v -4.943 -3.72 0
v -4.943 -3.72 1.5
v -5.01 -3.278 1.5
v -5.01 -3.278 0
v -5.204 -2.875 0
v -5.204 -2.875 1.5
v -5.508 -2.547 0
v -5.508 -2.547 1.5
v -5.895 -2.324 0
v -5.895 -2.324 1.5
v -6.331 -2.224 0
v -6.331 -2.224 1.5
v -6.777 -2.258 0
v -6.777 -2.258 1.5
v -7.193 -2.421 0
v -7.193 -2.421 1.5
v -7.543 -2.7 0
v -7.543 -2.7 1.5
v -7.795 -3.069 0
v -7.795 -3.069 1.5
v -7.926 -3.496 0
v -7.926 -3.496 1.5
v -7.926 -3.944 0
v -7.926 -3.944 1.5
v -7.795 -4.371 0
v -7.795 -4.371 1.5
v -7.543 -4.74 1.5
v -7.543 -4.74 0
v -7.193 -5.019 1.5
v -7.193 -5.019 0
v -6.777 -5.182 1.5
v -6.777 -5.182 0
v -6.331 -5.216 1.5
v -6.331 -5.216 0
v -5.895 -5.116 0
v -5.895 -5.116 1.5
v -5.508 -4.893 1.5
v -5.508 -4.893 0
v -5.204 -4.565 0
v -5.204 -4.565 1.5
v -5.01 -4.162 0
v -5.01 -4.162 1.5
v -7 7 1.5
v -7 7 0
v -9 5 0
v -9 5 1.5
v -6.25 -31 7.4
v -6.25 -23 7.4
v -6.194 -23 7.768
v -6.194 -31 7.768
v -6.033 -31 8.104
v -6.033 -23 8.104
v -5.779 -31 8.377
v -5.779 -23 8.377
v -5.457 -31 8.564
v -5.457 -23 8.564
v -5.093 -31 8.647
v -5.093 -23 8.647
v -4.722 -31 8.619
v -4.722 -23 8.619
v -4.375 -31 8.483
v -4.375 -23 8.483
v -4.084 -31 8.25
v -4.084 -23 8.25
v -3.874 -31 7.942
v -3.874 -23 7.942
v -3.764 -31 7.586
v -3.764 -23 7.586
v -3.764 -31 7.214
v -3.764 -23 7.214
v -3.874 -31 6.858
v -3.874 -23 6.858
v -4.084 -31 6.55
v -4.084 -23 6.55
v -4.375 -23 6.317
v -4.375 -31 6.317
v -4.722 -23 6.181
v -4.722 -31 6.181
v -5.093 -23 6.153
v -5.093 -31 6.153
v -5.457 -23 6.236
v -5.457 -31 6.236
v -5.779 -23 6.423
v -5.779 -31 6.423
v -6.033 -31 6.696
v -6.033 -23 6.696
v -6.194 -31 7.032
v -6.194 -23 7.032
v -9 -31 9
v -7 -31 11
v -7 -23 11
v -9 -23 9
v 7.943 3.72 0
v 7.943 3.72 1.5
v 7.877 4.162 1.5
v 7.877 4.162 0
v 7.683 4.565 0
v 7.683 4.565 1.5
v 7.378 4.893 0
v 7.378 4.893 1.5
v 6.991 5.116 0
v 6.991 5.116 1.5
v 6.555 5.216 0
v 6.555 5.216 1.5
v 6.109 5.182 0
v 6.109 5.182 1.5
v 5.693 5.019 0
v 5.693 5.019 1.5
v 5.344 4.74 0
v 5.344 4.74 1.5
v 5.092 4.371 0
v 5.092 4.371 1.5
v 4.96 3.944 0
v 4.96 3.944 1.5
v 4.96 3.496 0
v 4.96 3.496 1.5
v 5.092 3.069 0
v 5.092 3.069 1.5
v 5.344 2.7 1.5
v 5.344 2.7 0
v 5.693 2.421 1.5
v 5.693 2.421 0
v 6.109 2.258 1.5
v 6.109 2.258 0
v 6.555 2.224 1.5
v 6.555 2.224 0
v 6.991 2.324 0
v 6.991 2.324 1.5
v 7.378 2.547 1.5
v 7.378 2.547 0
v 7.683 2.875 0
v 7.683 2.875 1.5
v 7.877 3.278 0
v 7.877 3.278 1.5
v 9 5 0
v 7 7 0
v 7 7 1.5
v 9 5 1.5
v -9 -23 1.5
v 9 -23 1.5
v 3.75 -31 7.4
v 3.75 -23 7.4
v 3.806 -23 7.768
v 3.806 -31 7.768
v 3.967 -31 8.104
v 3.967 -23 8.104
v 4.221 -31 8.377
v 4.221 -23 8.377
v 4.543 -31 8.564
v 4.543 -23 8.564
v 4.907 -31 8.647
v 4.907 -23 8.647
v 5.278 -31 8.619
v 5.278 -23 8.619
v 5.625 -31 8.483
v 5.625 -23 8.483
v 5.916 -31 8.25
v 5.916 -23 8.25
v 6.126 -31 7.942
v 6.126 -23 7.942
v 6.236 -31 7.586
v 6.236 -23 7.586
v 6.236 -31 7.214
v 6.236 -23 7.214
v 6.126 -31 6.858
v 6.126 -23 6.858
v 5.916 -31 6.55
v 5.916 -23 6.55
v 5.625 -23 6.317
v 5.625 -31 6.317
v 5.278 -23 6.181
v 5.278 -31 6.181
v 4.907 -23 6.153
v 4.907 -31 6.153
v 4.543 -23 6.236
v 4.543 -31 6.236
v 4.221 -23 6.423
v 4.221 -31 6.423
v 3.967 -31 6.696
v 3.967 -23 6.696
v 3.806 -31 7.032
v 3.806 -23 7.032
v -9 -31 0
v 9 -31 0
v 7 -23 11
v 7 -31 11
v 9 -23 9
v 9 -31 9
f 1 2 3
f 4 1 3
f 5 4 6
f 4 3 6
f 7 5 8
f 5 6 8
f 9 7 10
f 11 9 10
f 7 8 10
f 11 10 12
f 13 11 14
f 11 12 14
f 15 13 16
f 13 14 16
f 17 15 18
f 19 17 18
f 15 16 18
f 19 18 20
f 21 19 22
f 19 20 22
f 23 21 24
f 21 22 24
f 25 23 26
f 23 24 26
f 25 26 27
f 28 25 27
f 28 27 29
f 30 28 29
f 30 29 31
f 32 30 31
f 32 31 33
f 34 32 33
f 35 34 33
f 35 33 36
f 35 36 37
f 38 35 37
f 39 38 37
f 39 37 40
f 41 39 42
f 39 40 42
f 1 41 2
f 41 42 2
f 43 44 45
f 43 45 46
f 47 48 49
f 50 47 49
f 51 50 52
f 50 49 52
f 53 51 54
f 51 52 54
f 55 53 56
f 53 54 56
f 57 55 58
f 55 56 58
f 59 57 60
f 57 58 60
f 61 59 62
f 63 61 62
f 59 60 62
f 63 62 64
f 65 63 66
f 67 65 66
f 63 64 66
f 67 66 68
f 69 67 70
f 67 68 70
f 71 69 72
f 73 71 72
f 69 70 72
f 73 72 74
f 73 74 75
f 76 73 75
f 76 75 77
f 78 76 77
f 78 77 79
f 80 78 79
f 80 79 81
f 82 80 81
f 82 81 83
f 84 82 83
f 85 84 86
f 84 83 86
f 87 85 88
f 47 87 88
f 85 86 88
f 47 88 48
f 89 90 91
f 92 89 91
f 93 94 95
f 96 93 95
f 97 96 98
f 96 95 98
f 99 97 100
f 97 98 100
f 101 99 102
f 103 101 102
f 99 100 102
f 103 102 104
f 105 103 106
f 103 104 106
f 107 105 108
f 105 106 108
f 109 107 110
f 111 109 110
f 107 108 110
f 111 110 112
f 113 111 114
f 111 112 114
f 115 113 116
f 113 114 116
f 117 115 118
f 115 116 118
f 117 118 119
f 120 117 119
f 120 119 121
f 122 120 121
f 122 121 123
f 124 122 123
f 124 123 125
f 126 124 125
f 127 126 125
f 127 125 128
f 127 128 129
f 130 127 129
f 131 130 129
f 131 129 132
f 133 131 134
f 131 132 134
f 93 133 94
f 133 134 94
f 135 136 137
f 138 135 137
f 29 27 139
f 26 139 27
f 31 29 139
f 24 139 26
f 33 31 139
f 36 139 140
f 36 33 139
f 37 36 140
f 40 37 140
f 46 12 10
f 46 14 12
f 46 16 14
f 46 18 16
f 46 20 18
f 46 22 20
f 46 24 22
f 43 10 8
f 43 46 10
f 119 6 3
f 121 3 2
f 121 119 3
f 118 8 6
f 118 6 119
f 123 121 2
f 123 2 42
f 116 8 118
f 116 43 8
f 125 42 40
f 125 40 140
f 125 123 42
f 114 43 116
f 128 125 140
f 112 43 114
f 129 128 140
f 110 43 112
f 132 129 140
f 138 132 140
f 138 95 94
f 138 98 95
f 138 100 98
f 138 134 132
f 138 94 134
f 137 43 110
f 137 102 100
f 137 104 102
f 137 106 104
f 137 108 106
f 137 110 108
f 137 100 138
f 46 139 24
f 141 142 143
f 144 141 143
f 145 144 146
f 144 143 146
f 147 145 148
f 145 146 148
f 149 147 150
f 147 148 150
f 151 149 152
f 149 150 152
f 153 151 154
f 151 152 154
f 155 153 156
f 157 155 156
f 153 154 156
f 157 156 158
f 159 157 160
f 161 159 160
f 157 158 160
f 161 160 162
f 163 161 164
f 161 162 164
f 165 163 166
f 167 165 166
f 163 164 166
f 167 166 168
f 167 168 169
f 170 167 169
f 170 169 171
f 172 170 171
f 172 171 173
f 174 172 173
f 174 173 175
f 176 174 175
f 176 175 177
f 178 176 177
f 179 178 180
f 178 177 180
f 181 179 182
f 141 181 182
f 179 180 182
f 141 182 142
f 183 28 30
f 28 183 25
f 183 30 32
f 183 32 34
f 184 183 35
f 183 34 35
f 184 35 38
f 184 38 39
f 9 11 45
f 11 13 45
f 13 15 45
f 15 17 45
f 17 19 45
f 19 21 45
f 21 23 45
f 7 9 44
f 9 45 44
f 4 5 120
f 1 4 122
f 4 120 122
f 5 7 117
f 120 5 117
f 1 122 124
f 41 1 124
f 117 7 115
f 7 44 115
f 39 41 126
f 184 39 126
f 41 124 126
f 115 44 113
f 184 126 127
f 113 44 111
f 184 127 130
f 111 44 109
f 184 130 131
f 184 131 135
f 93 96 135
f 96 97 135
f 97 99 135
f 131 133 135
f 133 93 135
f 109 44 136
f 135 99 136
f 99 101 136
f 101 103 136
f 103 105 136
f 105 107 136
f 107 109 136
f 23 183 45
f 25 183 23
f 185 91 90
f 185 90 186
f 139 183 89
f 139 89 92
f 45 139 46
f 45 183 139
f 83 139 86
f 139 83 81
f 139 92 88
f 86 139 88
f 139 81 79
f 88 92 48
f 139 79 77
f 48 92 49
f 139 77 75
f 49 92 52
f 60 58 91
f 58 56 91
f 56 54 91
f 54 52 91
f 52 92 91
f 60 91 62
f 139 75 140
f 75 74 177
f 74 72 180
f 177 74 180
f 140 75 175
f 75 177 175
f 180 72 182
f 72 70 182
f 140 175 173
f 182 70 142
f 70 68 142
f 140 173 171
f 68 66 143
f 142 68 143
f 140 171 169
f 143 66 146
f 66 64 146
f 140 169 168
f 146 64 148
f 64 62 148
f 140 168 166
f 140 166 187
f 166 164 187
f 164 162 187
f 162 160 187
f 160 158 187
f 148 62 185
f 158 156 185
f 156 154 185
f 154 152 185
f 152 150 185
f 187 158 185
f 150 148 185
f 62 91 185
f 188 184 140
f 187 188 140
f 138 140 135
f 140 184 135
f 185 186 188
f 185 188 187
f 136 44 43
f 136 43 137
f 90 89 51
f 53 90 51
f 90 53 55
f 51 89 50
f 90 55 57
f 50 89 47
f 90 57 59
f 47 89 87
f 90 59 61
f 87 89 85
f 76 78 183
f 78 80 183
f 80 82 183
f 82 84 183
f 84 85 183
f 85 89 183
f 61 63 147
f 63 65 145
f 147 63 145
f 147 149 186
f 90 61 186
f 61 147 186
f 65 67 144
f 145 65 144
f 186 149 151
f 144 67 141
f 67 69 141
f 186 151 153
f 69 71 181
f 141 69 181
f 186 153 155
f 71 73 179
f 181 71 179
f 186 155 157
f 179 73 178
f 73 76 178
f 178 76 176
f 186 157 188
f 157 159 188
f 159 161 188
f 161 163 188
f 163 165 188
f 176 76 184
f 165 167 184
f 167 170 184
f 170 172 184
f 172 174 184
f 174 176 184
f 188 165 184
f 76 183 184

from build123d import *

# Parameters (mm, degrees)
SKETCH1_W             = 18
SKETCH1_H             = 38
EXTRUDE1_DEPTH        = 11
SKETCH2_W             = 18
SKETCH2_H             = 30
EXTRUDE2_DEPTH        = 9.5
SKETCH3_R             = 1.5
EXTRUDE3_DEPTH        = 1.5
SKETCH4_R             = 1.25
EXTRUDE5_DEPTH        = 8
M3_TAPPED_HOLE3_D     = 2.5
M3_TAPPED_HOLE3_DEPTH = 11.5
M3_TAPPED_HOLE3_TIP   = 0.751075774
CHAMFER2_SIZE         = 2


with BuildPart() as part:
    # Sketch1 → Extrude1 (new body)
    with BuildSketch(Plane.XY):
        with Locations((0, -12)):
            Rectangle(SKETCH1_W, SKETCH1_H)
    extrude(amount=EXTRUDE1_DEPTH)

    # Sketch2 → Extrude2 (cut)
    with BuildSketch(Plane.XY.offset(11)):
        with Locations((0, -8)):
            Rectangle(SKETCH2_W, SKETCH2_H)
    extrude(amount=-EXTRUDE2_DEPTH, mode=Mode.SUBTRACT)

    # Sketch3 → Extrude3 (cut)
    with BuildSketch(Plane.XY.offset(1.5)):
        with Locations((6.443229004, 3.72)):
            Circle(SKETCH3_R)
        with Locations((-6.443229004, -3.72)):
            Circle(SKETCH3_R)
    extrude(amount=-EXTRUDE3_DEPTH, mode=Mode.SUBTRACT)

    # Sketch4 → Extrude5 (cut)
    with BuildSketch(Plane(origin=(0, -23, 0), x_dir=(1, 0, 0), z_dir=(0, 1, 0))):
        with Locations(Location((-5, -7.4, 0), (0, 0, 180))):
            Circle(SKETCH4_R)
        with Locations(Location((5, -7.4, 0), (0, 0, 180))):
            Circle(SKETCH4_R)
    extrude(amount=-EXTRUDE5_DEPTH, mode=Mode.SUBTRACT)

    # M3 Tapped Hole3
    with Locations(Plane(origin=(5, -31, 7.4), x_dir=(0, 0, -1), z_dir=(0, -1, 0))):
        with Locations((0, 0), (0, -10)):
            Hole(M3_TAPPED_HOLE3_D / 2, depth=M3_TAPPED_HOLE3_DEPTH)
            with Locations((0, 0, -(M3_TAPPED_HOLE3_DEPTH + M3_TAPPED_HOLE3_TIP / 2))):  # 118° drill point
                Cone(0, M3_TAPPED_HOLE3_D / 2, M3_TAPPED_HOLE3_TIP, mode=Mode.SUBTRACT)

    # Chamfer2
    chamfer2_edges = [part.edges().sort_by_distance(p)[0] for p in [
        (9, -27, 11),
        (-9, -27, 11),
        (-9, 7, 0.75),
        (9, 7, 0.75),
    ]]
    chamfer(chamfer2_edges, length=CHAMFER2_SIZE)


solid = part.part
